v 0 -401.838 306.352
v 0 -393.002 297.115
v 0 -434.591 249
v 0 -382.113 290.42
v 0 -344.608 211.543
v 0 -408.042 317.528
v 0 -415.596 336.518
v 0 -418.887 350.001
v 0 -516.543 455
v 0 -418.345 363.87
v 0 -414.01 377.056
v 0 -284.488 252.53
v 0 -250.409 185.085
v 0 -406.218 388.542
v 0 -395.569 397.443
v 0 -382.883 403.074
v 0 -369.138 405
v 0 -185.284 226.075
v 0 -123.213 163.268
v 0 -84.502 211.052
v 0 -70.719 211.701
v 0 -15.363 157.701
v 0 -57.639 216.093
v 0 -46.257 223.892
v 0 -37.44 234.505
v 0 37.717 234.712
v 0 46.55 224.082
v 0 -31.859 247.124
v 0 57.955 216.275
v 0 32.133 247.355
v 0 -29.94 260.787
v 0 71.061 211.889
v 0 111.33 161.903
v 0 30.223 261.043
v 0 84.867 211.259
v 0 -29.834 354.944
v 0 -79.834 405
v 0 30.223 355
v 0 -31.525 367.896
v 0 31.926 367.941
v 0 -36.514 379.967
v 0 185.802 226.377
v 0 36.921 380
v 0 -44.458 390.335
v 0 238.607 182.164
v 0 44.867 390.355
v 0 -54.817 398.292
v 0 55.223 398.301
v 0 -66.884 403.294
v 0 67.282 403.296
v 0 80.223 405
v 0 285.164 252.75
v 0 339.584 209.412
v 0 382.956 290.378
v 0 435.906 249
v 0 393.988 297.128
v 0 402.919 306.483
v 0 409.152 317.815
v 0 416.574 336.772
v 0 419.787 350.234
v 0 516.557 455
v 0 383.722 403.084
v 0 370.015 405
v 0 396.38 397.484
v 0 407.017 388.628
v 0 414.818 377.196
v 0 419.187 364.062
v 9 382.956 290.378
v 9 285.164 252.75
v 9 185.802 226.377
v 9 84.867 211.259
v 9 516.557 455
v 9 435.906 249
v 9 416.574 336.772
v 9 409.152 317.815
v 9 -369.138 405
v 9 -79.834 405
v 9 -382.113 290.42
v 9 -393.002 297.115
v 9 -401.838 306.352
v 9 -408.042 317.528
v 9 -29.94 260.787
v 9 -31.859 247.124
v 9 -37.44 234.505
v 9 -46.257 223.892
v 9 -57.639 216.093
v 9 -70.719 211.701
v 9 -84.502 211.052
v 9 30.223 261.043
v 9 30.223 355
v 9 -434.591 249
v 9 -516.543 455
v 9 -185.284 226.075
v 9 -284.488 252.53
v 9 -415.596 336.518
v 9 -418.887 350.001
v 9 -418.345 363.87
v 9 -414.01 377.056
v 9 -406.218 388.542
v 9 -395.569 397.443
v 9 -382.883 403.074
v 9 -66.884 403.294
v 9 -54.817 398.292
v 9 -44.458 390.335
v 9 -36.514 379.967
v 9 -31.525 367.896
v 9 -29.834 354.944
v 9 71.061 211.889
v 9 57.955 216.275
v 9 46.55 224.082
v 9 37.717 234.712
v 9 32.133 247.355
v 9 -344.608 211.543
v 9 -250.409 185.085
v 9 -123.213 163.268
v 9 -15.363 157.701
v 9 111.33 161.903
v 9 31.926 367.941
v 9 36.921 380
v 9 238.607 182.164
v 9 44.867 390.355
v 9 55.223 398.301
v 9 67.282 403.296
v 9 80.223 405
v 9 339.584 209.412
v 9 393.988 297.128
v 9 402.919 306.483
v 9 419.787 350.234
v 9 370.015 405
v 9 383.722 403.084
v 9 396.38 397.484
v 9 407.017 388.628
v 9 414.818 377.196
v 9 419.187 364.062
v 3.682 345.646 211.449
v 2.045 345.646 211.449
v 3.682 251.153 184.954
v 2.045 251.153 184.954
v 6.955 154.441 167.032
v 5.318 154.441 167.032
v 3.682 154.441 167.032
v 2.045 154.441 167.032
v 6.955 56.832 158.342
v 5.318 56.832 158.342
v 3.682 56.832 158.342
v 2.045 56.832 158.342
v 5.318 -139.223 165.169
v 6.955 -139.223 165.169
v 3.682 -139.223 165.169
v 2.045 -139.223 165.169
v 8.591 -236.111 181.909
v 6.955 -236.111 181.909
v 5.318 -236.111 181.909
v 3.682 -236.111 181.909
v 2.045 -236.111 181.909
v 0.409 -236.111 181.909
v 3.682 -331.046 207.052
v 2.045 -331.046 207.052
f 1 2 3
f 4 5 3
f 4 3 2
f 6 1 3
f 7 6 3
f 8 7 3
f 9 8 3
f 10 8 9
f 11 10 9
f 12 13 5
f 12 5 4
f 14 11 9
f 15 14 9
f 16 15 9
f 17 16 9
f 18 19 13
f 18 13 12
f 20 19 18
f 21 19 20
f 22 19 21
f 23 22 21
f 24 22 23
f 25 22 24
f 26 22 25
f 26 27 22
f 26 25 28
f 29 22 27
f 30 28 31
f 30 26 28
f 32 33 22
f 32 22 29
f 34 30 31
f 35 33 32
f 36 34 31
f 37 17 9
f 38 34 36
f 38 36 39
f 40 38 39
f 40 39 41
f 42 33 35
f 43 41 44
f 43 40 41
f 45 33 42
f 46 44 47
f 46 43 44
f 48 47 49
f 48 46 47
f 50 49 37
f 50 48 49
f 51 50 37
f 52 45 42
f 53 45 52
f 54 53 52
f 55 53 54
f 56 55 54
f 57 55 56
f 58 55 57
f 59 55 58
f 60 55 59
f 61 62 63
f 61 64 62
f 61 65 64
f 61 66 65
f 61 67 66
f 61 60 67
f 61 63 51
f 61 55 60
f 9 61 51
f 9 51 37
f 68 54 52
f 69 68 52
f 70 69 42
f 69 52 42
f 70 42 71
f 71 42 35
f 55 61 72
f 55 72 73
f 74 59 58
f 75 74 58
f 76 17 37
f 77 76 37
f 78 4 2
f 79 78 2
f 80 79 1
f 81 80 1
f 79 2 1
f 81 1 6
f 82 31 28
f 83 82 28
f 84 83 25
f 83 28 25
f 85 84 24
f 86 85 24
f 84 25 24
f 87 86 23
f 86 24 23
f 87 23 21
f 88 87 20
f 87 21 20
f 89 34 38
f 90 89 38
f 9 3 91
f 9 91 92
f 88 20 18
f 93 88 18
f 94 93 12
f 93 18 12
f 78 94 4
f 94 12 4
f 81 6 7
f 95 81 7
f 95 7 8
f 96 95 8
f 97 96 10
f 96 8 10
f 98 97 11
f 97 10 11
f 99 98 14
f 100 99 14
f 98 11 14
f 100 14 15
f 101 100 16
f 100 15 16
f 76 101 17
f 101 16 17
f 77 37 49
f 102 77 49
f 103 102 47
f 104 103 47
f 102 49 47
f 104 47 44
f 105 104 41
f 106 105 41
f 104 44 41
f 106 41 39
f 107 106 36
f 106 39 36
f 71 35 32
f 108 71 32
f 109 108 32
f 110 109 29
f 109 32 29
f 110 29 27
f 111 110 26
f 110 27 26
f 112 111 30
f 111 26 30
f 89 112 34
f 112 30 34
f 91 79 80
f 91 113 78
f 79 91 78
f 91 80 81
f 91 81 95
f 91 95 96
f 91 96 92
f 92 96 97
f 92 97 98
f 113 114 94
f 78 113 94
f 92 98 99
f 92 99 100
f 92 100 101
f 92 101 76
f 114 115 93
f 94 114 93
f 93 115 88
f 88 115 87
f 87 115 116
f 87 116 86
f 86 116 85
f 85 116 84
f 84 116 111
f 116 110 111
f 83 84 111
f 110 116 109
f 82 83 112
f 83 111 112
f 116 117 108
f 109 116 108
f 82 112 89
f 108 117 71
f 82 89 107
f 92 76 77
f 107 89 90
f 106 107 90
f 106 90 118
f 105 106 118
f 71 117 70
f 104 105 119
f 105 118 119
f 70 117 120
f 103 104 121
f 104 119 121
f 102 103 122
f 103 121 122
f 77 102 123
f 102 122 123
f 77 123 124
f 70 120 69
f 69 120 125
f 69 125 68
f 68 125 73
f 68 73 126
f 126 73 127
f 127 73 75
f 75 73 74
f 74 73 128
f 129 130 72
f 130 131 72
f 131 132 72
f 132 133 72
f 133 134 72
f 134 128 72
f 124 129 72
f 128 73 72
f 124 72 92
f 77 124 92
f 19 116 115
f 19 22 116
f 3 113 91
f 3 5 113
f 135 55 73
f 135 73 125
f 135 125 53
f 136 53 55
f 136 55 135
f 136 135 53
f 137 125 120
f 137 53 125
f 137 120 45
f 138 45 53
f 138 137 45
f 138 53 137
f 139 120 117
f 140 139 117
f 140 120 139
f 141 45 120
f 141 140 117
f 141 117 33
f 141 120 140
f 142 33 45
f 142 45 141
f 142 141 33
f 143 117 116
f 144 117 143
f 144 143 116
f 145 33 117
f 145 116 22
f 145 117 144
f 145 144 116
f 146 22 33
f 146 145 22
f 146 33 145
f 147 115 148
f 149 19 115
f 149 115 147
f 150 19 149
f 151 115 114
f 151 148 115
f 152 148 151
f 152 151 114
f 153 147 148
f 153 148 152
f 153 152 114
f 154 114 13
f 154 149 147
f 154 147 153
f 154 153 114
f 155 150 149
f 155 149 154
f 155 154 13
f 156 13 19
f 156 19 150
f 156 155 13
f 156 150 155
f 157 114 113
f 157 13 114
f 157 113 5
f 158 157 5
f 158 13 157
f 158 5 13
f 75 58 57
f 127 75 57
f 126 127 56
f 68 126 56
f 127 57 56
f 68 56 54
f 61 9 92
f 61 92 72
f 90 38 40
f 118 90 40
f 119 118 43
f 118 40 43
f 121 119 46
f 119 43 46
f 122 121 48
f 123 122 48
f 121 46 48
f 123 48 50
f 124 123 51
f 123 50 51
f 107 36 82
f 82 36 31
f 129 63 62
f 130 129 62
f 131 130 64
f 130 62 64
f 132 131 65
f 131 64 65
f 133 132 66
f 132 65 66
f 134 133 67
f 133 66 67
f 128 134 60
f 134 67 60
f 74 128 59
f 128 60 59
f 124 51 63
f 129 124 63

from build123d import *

# Parameters (mm, degrees)
EXTRUDE_4_DEPTH = 9


with BuildPart() as part:
    # Эскиз1 → Бобышка-Вытянуть4 (new body)
    with BuildSketch(Plane(origin=(0, 0, 0), x_dir=(0, 0, -1), z_dir=(1, 0, 0))):
        with BuildLine():
            Line((-455, -516.542644104), (-455, 516.556548518))
            Line((-455, 516.556548518), (-248.999999692, 435.905604479))
            add(Edge.make_bspline(
                [(-248.999999692, 435.905604479), (-244.812182794, 427.580683135), (-236.801363167, 410.73826292), (-222.212406758, 376.463926678), (-206.472110198, 332.573595341), (-191.065214882, 278.622516157), (-178.618404528, 223.741954043), (-168.601235151, 168.376182512), (-162.664180548, 121.995794186), (-159.588454358, 84.78039118), (-158.191016915, 56.847307797), (-157.699086883, 28.820440013), (-157.668208508, 0.657149051), (-157.69908686, -27.506141911), (-158.191016904, -55.533009684), (-159.588454431, -83.466093036), (-162.664180797, -120.681496001), (-168.601235656, -167.061884287), (-178.618405136, -222.427655869), (-191.065215126, -277.308218149), (-206.47210996, -331.259297463), (-222.212406313, -375.149628797), (-236.801362845, -409.423964908), (-244.812182664, -426.266385019), (-248.999999692, -434.591306286)],
                knots=[0.002534483, 0.002534483, 0.002534483, 0.002534483, 0.033626078, 0.064717673, 0.126900862, 0.189084052, 0.251267242, 0.313450431, 0.375633621, 0.406725216, 0.43781681, 0.468908405, 0.5, 0.531091595, 0.56218319, 0.593274784, 0.624366379, 0.686549569, 0.748732758, 0.810915948, 0.873099138, 0.935282327, 0.966373922, 0.997465517, 0.997465517, 0.997465517, 0.997465517], degree=3))
            Line((-248.999999692, -434.591306286), (-455, -516.542644104))
        make_face()
        with BuildLine():
            Line((-405, -369.137843077), (-405, -79.83378018))
            ThreePointArc((-405, -79.83378018), (-390.335381972, -44.458495292), (-354.943568764, -29.833812025))
            Line((-354.943568764, -29.833812025), (-260.787453694, -29.940079012))
            ThreePointArc((-260.787453694, -29.940079012), (-223.891969122, -46.256877511), (-211.052398945, -84.501617445))
            add(Edge.make_bspline(
                [(-211.052398945, -84.501617445), (-216.00272922, -138.536584682), (-234.431884839, -238.848455182), (-270.011454394, -336.792856901), (-290.419546493, -382.113233823)],
                knots=[0.6034229, 0.6034229, 0.6034229, 0.6034229, 0.80171145, 0.97615254, 0.97615254, 0.97615254, 0.97615254], degree=3))
            ThreePointArc((-290.419546493, -382.113233823), (-301.450056693, -397.716221108), (-317.52810706, -408.041997779))
            Line((-317.52810706, -408.041997779), (-336.517727965, -415.596487272))
            ThreePointArc((-336.517727965, -415.596487272), (-383.070325953, -410.514851196), (-405, -369.137843077))
        make_face(mode=Mode.SUBTRACT)
        with BuildLine():
            Line((-336.771752099, 416.573644789), (-317.815177046, 409.151966772))
            ThreePointArc((-317.815177046, 409.151966772), (-301.515585195, 398.756977377), (-290.377663678, 382.955736813))
            add(Edge.make_bspline(
                [(-290.377663678, 382.955736813), (-270.15153544, 337.596182562), (-234.790316493, 239.488359394), (-216.31168023, 139.023424648), (-211.259016819, 84.867467904)],
                knots=[0.024188491, 0.024188491, 0.024188491, 0.024188491, 0.1987169, 0.3974338, 0.3974338, 0.3974338, 0.3974338], degree=3))
            ThreePointArc((-211.259016819, 84.867467904), (-224.0817696, 46.549566009), (-261.042812551, 30.222720063))
            Line((-261.042812551, 30.222720063), (-355, 30.222720063))
            ThreePointArc((-355, 30.222720063), (-390.355339059, 44.867381004), (-405, 80.222720063))
            Line((-405, 80.222720063), (-405, 370.014746838))
            ThreePointArc((-405, 370.014746838), (-383.183218455, 411.314942933), (-336.771752099, 416.573644789))
        make_face(mode=Mode.SUBTRACT)
    extrude(amount=EXTRUDE_4_DEPTH)


solid = part.part
